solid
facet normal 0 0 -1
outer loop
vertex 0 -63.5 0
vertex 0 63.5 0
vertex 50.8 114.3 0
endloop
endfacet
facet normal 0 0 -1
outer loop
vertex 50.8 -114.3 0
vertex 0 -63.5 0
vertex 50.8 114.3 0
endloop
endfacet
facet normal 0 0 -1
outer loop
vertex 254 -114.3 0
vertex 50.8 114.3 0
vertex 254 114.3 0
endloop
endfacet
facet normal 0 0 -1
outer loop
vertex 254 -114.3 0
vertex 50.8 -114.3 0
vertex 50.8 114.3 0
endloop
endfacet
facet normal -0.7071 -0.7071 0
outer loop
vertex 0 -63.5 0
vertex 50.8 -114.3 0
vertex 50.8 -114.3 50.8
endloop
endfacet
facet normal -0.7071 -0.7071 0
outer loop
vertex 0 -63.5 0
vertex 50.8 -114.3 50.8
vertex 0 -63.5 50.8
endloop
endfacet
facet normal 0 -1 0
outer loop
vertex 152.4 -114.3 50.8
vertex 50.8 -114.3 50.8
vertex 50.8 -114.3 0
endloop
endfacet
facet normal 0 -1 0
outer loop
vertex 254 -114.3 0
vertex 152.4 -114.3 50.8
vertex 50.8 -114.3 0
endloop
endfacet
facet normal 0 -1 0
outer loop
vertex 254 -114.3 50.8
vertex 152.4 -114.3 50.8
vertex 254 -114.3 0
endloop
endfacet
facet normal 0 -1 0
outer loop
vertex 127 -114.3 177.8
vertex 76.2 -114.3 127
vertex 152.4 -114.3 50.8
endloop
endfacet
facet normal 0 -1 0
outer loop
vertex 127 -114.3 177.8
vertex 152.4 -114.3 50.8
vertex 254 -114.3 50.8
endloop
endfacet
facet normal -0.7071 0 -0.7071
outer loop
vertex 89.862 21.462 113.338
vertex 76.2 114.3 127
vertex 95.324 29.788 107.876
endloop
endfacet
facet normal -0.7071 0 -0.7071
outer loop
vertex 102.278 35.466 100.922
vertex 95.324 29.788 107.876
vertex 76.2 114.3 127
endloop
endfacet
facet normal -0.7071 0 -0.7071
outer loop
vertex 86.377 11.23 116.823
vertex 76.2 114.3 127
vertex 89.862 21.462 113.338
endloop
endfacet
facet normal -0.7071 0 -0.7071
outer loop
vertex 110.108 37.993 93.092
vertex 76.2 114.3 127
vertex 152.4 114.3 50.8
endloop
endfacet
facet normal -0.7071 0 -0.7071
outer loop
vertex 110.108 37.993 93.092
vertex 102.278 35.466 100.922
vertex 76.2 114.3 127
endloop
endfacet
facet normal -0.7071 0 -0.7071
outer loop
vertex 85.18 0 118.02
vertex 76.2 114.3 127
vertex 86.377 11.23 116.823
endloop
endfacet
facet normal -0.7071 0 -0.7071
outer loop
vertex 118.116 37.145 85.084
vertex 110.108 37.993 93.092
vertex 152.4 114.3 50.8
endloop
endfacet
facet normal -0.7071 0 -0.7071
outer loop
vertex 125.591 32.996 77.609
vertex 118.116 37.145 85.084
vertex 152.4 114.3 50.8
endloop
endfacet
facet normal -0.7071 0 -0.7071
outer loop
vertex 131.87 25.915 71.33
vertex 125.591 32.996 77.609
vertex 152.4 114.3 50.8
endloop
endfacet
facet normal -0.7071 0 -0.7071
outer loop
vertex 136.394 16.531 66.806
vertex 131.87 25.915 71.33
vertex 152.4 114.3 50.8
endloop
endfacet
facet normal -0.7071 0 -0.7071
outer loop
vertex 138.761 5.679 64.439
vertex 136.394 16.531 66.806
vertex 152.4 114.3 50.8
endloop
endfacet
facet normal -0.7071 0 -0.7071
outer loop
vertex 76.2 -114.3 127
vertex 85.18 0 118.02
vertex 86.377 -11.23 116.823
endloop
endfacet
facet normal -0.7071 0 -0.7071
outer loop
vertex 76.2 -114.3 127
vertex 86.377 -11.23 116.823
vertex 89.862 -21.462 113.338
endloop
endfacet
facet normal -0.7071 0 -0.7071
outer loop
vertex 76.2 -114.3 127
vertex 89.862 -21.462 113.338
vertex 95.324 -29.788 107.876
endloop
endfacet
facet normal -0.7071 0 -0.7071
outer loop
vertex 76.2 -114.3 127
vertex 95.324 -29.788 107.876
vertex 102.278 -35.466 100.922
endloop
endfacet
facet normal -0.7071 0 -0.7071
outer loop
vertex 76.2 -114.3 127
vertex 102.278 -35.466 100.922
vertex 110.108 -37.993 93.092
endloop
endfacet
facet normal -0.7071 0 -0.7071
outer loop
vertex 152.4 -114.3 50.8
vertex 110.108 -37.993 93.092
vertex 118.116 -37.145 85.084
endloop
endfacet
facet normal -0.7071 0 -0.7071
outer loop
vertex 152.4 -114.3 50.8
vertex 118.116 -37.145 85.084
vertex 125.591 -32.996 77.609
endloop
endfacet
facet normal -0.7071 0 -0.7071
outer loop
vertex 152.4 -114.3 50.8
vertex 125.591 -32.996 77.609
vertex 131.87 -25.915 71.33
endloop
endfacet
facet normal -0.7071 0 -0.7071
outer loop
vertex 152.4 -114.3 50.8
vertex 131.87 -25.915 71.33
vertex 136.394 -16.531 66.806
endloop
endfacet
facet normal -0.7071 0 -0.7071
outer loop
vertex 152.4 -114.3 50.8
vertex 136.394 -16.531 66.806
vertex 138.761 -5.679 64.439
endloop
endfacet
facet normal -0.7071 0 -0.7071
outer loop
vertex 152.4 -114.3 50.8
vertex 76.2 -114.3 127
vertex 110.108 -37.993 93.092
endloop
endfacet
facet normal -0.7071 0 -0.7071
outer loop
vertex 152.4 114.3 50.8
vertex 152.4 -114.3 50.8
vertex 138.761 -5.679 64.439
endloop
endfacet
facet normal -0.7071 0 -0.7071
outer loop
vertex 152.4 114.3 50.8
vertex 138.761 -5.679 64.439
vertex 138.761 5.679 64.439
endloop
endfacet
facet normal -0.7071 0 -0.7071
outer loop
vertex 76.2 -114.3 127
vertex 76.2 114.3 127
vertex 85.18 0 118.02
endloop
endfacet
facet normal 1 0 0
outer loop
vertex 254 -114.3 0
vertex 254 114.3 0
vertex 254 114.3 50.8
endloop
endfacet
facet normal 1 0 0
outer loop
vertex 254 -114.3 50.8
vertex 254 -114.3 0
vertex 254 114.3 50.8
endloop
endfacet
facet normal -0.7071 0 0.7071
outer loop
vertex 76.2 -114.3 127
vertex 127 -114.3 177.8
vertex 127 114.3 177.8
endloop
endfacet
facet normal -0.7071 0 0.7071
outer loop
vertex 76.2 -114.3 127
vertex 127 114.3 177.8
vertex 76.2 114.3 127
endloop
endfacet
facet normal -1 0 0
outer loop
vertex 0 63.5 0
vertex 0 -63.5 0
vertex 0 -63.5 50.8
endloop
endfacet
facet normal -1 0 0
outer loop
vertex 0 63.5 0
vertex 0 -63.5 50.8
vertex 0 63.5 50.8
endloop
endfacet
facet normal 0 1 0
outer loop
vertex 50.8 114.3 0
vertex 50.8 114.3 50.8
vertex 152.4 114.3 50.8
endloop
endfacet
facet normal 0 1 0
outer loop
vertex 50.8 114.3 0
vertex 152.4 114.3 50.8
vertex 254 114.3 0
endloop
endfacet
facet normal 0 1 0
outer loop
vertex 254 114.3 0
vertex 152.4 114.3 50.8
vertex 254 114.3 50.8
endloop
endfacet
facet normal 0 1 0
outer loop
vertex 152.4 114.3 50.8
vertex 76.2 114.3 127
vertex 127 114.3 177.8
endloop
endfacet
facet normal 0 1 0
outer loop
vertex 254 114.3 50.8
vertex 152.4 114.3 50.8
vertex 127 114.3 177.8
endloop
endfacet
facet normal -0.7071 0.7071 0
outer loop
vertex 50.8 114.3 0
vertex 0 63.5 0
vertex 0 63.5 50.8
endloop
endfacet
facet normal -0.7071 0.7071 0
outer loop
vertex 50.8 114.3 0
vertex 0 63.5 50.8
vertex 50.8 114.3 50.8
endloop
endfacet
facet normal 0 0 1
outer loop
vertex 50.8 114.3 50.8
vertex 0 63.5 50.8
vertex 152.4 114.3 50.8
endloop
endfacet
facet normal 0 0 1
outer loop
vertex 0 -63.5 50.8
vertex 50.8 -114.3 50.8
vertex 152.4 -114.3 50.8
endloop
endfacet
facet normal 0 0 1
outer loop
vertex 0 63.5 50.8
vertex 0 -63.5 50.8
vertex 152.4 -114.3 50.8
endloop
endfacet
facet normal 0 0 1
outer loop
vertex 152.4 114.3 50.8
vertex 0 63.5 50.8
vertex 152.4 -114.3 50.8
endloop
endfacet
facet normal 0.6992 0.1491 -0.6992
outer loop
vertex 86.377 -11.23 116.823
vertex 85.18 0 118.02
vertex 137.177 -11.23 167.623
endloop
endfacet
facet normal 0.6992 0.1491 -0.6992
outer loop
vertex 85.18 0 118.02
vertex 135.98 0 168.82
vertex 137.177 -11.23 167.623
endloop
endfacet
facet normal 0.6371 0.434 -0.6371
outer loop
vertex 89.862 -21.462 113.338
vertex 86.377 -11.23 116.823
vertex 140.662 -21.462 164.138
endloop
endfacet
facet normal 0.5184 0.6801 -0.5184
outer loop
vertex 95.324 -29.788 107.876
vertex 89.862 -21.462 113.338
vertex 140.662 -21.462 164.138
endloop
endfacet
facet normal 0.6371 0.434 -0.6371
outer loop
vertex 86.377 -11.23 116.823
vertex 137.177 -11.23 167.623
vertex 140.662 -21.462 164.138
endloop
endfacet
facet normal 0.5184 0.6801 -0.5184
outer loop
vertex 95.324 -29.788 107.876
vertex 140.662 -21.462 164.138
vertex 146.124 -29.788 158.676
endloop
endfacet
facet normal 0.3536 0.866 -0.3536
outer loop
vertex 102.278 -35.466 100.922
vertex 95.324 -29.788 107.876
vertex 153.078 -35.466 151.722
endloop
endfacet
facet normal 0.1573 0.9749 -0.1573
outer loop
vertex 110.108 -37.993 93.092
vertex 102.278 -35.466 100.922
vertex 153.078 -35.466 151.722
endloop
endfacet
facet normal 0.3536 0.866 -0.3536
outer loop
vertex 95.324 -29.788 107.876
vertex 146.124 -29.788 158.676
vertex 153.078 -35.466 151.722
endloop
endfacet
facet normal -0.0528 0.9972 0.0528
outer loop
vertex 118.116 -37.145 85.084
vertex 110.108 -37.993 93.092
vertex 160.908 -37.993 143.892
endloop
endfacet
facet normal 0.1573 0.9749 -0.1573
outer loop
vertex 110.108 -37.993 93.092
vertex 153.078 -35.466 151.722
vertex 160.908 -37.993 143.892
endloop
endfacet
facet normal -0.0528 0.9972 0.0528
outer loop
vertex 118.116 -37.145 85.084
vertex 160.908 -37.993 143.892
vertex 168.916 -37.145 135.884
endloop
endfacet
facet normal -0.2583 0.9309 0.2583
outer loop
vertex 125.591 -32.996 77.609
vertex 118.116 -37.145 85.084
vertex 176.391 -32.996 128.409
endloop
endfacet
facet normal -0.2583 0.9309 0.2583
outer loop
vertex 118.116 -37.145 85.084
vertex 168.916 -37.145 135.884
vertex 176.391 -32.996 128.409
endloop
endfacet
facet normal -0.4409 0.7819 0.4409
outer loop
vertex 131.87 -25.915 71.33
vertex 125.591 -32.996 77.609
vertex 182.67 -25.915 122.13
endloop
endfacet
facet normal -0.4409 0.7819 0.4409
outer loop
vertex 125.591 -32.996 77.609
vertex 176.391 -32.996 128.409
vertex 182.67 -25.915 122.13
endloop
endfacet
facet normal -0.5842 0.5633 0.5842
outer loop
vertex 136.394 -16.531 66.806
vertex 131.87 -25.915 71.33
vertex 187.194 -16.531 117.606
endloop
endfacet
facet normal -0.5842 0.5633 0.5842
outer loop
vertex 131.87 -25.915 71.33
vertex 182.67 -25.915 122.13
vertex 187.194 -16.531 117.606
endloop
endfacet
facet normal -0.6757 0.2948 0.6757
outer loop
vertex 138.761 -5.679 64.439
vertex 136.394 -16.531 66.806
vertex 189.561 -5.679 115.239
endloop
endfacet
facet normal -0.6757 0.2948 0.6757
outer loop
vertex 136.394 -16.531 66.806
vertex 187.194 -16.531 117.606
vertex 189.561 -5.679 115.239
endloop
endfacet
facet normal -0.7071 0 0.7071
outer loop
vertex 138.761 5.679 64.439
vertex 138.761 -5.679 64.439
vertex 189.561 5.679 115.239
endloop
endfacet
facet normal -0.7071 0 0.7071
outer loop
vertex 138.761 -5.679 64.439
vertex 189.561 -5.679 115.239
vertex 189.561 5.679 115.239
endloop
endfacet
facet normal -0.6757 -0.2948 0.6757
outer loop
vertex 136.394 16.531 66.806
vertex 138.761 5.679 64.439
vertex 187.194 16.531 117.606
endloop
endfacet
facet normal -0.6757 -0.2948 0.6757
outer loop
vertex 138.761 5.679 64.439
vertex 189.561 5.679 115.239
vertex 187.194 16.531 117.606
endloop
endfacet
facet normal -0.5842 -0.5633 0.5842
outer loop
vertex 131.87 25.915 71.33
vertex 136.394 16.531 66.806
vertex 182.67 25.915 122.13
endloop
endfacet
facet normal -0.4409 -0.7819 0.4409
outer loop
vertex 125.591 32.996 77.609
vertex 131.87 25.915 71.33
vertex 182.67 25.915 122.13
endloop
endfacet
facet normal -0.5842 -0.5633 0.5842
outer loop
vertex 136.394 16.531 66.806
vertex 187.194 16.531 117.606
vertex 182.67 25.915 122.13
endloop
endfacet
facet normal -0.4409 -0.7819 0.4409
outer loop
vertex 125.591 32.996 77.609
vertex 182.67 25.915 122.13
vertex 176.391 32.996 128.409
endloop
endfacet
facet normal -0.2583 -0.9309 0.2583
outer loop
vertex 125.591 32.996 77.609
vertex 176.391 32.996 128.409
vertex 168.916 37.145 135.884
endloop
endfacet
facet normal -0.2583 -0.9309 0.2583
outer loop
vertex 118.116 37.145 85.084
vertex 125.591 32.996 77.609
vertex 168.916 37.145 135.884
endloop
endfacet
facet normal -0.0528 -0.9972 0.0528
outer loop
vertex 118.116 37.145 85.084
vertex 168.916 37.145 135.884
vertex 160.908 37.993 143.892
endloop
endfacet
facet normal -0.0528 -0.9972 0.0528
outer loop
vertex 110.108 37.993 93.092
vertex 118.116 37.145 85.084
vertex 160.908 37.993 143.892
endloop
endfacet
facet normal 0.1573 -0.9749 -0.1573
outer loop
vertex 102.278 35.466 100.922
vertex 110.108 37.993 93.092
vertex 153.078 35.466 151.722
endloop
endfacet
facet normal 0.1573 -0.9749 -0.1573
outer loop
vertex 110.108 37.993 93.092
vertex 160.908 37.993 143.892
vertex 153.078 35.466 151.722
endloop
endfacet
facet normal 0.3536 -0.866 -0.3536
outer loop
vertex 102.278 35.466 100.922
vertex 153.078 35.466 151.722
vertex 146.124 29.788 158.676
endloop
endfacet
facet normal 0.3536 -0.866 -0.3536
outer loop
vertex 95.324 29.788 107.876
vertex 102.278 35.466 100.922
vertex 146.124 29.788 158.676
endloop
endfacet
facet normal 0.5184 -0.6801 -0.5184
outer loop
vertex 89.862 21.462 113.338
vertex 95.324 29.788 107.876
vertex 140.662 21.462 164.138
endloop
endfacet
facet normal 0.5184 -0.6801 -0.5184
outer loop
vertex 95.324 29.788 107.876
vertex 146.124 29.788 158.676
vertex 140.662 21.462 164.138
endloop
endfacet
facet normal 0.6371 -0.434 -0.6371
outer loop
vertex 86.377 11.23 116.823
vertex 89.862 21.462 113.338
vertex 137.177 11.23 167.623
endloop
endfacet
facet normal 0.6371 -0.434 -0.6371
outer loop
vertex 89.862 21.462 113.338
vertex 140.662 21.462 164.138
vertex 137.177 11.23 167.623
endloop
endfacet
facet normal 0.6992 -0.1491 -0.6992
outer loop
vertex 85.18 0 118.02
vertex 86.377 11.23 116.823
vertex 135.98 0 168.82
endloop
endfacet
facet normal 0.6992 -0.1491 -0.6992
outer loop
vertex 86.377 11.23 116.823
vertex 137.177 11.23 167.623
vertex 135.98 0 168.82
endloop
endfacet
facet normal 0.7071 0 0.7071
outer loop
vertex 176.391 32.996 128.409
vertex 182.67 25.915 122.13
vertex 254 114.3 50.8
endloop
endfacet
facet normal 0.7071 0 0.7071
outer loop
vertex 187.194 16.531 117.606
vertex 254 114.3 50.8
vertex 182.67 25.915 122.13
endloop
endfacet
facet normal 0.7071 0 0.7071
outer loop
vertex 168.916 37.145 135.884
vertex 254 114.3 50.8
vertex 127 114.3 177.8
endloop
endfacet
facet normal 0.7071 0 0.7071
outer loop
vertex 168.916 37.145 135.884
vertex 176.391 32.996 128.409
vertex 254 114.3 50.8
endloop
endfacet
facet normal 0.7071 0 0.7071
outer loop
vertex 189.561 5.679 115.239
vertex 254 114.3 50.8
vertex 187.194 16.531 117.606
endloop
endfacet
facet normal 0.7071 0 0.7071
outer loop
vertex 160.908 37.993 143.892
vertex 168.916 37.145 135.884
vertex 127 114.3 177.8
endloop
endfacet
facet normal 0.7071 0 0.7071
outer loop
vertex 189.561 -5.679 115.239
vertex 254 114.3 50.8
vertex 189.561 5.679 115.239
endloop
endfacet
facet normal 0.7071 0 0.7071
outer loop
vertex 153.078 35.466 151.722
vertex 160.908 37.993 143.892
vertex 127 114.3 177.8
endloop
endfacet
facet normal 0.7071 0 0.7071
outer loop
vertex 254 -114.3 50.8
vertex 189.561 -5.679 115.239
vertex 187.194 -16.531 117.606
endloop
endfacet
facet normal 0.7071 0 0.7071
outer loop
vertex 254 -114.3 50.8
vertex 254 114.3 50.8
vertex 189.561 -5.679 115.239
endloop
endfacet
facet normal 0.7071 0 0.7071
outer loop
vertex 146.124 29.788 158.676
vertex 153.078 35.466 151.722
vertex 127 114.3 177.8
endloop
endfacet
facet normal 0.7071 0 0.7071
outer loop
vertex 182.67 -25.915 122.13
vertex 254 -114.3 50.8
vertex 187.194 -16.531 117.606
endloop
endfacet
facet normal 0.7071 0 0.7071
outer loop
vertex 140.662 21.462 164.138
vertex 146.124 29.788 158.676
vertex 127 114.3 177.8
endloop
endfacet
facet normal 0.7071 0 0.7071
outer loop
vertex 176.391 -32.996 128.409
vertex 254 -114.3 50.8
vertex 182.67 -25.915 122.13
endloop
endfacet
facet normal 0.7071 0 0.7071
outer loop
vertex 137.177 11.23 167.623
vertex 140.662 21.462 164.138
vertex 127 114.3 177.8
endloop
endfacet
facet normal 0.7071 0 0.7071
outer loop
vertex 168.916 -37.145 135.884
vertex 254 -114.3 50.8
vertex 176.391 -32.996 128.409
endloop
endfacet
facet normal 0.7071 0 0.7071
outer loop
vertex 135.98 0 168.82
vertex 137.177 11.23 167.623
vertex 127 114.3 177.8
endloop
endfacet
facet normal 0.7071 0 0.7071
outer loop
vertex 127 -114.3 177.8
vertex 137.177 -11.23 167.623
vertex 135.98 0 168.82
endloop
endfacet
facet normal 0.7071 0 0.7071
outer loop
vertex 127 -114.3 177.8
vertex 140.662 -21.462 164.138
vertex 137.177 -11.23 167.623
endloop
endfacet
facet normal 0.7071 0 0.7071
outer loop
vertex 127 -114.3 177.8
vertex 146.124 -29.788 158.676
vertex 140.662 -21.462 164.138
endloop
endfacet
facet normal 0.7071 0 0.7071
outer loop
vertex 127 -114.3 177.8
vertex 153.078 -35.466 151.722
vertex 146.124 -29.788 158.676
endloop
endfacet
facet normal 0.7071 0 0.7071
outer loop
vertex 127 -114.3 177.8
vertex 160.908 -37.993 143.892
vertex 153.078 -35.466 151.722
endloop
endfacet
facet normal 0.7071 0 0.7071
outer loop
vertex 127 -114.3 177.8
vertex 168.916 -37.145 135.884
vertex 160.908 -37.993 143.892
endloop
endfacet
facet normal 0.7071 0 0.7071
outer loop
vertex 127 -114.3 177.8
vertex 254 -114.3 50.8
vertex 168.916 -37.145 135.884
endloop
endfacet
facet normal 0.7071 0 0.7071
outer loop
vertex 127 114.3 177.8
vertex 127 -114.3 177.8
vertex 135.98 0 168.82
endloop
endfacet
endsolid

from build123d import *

# Parameters (mm, degrees)
F1_DEPTH = 114.3
F3_DEPTH = 50.8
F5_DEPTH = 76.2


with BuildPart() as f1:
    # F0 (on Front) → F1 (new body, symmetric)
    with BuildSketch(Plane.XZ):
        Polygon((50.8, 50.8), (50.8, 0), (254, 0), (254, 50.8), (127, 177.8), (76.2, 127), (152.4, 50.8), align=None)
    extrude(amount=F1_DEPTH, both=True)

    # F2 (on face) → F3 (join)
    with BuildSketch(Plane(origin=(0, 0, 0), x_dir=(1, 0, 0), z_dir=(0, 0, -1))):
        Polygon((50.8, -114.3), (50.8, 114.3), (0, 63.5), (0, 0), (0, -63.5), align=None)
    extrude(amount=-F3_DEPTH)

    # F4 (on face) → F5 (cut, symmetric)
    with BuildSketch(Plane(origin=(152.4, 0, 152.4), x_dir=(0.707107, 0, -0.707107), z_dir=(0.707107, 0, 0.707107))):
        with BuildLine():
            ThreePointArc((52.978976, 0), (14.878976, 38.1), (-23.221024, 0))
            ThreePointArc((-23.221024, 0), (14.878976, -38.1), (52.978976, 0))
        make_face()
    extrude(amount=F5_DEPTH, both=True, mode=Mode.SUBTRACT)


solid = f1.part
